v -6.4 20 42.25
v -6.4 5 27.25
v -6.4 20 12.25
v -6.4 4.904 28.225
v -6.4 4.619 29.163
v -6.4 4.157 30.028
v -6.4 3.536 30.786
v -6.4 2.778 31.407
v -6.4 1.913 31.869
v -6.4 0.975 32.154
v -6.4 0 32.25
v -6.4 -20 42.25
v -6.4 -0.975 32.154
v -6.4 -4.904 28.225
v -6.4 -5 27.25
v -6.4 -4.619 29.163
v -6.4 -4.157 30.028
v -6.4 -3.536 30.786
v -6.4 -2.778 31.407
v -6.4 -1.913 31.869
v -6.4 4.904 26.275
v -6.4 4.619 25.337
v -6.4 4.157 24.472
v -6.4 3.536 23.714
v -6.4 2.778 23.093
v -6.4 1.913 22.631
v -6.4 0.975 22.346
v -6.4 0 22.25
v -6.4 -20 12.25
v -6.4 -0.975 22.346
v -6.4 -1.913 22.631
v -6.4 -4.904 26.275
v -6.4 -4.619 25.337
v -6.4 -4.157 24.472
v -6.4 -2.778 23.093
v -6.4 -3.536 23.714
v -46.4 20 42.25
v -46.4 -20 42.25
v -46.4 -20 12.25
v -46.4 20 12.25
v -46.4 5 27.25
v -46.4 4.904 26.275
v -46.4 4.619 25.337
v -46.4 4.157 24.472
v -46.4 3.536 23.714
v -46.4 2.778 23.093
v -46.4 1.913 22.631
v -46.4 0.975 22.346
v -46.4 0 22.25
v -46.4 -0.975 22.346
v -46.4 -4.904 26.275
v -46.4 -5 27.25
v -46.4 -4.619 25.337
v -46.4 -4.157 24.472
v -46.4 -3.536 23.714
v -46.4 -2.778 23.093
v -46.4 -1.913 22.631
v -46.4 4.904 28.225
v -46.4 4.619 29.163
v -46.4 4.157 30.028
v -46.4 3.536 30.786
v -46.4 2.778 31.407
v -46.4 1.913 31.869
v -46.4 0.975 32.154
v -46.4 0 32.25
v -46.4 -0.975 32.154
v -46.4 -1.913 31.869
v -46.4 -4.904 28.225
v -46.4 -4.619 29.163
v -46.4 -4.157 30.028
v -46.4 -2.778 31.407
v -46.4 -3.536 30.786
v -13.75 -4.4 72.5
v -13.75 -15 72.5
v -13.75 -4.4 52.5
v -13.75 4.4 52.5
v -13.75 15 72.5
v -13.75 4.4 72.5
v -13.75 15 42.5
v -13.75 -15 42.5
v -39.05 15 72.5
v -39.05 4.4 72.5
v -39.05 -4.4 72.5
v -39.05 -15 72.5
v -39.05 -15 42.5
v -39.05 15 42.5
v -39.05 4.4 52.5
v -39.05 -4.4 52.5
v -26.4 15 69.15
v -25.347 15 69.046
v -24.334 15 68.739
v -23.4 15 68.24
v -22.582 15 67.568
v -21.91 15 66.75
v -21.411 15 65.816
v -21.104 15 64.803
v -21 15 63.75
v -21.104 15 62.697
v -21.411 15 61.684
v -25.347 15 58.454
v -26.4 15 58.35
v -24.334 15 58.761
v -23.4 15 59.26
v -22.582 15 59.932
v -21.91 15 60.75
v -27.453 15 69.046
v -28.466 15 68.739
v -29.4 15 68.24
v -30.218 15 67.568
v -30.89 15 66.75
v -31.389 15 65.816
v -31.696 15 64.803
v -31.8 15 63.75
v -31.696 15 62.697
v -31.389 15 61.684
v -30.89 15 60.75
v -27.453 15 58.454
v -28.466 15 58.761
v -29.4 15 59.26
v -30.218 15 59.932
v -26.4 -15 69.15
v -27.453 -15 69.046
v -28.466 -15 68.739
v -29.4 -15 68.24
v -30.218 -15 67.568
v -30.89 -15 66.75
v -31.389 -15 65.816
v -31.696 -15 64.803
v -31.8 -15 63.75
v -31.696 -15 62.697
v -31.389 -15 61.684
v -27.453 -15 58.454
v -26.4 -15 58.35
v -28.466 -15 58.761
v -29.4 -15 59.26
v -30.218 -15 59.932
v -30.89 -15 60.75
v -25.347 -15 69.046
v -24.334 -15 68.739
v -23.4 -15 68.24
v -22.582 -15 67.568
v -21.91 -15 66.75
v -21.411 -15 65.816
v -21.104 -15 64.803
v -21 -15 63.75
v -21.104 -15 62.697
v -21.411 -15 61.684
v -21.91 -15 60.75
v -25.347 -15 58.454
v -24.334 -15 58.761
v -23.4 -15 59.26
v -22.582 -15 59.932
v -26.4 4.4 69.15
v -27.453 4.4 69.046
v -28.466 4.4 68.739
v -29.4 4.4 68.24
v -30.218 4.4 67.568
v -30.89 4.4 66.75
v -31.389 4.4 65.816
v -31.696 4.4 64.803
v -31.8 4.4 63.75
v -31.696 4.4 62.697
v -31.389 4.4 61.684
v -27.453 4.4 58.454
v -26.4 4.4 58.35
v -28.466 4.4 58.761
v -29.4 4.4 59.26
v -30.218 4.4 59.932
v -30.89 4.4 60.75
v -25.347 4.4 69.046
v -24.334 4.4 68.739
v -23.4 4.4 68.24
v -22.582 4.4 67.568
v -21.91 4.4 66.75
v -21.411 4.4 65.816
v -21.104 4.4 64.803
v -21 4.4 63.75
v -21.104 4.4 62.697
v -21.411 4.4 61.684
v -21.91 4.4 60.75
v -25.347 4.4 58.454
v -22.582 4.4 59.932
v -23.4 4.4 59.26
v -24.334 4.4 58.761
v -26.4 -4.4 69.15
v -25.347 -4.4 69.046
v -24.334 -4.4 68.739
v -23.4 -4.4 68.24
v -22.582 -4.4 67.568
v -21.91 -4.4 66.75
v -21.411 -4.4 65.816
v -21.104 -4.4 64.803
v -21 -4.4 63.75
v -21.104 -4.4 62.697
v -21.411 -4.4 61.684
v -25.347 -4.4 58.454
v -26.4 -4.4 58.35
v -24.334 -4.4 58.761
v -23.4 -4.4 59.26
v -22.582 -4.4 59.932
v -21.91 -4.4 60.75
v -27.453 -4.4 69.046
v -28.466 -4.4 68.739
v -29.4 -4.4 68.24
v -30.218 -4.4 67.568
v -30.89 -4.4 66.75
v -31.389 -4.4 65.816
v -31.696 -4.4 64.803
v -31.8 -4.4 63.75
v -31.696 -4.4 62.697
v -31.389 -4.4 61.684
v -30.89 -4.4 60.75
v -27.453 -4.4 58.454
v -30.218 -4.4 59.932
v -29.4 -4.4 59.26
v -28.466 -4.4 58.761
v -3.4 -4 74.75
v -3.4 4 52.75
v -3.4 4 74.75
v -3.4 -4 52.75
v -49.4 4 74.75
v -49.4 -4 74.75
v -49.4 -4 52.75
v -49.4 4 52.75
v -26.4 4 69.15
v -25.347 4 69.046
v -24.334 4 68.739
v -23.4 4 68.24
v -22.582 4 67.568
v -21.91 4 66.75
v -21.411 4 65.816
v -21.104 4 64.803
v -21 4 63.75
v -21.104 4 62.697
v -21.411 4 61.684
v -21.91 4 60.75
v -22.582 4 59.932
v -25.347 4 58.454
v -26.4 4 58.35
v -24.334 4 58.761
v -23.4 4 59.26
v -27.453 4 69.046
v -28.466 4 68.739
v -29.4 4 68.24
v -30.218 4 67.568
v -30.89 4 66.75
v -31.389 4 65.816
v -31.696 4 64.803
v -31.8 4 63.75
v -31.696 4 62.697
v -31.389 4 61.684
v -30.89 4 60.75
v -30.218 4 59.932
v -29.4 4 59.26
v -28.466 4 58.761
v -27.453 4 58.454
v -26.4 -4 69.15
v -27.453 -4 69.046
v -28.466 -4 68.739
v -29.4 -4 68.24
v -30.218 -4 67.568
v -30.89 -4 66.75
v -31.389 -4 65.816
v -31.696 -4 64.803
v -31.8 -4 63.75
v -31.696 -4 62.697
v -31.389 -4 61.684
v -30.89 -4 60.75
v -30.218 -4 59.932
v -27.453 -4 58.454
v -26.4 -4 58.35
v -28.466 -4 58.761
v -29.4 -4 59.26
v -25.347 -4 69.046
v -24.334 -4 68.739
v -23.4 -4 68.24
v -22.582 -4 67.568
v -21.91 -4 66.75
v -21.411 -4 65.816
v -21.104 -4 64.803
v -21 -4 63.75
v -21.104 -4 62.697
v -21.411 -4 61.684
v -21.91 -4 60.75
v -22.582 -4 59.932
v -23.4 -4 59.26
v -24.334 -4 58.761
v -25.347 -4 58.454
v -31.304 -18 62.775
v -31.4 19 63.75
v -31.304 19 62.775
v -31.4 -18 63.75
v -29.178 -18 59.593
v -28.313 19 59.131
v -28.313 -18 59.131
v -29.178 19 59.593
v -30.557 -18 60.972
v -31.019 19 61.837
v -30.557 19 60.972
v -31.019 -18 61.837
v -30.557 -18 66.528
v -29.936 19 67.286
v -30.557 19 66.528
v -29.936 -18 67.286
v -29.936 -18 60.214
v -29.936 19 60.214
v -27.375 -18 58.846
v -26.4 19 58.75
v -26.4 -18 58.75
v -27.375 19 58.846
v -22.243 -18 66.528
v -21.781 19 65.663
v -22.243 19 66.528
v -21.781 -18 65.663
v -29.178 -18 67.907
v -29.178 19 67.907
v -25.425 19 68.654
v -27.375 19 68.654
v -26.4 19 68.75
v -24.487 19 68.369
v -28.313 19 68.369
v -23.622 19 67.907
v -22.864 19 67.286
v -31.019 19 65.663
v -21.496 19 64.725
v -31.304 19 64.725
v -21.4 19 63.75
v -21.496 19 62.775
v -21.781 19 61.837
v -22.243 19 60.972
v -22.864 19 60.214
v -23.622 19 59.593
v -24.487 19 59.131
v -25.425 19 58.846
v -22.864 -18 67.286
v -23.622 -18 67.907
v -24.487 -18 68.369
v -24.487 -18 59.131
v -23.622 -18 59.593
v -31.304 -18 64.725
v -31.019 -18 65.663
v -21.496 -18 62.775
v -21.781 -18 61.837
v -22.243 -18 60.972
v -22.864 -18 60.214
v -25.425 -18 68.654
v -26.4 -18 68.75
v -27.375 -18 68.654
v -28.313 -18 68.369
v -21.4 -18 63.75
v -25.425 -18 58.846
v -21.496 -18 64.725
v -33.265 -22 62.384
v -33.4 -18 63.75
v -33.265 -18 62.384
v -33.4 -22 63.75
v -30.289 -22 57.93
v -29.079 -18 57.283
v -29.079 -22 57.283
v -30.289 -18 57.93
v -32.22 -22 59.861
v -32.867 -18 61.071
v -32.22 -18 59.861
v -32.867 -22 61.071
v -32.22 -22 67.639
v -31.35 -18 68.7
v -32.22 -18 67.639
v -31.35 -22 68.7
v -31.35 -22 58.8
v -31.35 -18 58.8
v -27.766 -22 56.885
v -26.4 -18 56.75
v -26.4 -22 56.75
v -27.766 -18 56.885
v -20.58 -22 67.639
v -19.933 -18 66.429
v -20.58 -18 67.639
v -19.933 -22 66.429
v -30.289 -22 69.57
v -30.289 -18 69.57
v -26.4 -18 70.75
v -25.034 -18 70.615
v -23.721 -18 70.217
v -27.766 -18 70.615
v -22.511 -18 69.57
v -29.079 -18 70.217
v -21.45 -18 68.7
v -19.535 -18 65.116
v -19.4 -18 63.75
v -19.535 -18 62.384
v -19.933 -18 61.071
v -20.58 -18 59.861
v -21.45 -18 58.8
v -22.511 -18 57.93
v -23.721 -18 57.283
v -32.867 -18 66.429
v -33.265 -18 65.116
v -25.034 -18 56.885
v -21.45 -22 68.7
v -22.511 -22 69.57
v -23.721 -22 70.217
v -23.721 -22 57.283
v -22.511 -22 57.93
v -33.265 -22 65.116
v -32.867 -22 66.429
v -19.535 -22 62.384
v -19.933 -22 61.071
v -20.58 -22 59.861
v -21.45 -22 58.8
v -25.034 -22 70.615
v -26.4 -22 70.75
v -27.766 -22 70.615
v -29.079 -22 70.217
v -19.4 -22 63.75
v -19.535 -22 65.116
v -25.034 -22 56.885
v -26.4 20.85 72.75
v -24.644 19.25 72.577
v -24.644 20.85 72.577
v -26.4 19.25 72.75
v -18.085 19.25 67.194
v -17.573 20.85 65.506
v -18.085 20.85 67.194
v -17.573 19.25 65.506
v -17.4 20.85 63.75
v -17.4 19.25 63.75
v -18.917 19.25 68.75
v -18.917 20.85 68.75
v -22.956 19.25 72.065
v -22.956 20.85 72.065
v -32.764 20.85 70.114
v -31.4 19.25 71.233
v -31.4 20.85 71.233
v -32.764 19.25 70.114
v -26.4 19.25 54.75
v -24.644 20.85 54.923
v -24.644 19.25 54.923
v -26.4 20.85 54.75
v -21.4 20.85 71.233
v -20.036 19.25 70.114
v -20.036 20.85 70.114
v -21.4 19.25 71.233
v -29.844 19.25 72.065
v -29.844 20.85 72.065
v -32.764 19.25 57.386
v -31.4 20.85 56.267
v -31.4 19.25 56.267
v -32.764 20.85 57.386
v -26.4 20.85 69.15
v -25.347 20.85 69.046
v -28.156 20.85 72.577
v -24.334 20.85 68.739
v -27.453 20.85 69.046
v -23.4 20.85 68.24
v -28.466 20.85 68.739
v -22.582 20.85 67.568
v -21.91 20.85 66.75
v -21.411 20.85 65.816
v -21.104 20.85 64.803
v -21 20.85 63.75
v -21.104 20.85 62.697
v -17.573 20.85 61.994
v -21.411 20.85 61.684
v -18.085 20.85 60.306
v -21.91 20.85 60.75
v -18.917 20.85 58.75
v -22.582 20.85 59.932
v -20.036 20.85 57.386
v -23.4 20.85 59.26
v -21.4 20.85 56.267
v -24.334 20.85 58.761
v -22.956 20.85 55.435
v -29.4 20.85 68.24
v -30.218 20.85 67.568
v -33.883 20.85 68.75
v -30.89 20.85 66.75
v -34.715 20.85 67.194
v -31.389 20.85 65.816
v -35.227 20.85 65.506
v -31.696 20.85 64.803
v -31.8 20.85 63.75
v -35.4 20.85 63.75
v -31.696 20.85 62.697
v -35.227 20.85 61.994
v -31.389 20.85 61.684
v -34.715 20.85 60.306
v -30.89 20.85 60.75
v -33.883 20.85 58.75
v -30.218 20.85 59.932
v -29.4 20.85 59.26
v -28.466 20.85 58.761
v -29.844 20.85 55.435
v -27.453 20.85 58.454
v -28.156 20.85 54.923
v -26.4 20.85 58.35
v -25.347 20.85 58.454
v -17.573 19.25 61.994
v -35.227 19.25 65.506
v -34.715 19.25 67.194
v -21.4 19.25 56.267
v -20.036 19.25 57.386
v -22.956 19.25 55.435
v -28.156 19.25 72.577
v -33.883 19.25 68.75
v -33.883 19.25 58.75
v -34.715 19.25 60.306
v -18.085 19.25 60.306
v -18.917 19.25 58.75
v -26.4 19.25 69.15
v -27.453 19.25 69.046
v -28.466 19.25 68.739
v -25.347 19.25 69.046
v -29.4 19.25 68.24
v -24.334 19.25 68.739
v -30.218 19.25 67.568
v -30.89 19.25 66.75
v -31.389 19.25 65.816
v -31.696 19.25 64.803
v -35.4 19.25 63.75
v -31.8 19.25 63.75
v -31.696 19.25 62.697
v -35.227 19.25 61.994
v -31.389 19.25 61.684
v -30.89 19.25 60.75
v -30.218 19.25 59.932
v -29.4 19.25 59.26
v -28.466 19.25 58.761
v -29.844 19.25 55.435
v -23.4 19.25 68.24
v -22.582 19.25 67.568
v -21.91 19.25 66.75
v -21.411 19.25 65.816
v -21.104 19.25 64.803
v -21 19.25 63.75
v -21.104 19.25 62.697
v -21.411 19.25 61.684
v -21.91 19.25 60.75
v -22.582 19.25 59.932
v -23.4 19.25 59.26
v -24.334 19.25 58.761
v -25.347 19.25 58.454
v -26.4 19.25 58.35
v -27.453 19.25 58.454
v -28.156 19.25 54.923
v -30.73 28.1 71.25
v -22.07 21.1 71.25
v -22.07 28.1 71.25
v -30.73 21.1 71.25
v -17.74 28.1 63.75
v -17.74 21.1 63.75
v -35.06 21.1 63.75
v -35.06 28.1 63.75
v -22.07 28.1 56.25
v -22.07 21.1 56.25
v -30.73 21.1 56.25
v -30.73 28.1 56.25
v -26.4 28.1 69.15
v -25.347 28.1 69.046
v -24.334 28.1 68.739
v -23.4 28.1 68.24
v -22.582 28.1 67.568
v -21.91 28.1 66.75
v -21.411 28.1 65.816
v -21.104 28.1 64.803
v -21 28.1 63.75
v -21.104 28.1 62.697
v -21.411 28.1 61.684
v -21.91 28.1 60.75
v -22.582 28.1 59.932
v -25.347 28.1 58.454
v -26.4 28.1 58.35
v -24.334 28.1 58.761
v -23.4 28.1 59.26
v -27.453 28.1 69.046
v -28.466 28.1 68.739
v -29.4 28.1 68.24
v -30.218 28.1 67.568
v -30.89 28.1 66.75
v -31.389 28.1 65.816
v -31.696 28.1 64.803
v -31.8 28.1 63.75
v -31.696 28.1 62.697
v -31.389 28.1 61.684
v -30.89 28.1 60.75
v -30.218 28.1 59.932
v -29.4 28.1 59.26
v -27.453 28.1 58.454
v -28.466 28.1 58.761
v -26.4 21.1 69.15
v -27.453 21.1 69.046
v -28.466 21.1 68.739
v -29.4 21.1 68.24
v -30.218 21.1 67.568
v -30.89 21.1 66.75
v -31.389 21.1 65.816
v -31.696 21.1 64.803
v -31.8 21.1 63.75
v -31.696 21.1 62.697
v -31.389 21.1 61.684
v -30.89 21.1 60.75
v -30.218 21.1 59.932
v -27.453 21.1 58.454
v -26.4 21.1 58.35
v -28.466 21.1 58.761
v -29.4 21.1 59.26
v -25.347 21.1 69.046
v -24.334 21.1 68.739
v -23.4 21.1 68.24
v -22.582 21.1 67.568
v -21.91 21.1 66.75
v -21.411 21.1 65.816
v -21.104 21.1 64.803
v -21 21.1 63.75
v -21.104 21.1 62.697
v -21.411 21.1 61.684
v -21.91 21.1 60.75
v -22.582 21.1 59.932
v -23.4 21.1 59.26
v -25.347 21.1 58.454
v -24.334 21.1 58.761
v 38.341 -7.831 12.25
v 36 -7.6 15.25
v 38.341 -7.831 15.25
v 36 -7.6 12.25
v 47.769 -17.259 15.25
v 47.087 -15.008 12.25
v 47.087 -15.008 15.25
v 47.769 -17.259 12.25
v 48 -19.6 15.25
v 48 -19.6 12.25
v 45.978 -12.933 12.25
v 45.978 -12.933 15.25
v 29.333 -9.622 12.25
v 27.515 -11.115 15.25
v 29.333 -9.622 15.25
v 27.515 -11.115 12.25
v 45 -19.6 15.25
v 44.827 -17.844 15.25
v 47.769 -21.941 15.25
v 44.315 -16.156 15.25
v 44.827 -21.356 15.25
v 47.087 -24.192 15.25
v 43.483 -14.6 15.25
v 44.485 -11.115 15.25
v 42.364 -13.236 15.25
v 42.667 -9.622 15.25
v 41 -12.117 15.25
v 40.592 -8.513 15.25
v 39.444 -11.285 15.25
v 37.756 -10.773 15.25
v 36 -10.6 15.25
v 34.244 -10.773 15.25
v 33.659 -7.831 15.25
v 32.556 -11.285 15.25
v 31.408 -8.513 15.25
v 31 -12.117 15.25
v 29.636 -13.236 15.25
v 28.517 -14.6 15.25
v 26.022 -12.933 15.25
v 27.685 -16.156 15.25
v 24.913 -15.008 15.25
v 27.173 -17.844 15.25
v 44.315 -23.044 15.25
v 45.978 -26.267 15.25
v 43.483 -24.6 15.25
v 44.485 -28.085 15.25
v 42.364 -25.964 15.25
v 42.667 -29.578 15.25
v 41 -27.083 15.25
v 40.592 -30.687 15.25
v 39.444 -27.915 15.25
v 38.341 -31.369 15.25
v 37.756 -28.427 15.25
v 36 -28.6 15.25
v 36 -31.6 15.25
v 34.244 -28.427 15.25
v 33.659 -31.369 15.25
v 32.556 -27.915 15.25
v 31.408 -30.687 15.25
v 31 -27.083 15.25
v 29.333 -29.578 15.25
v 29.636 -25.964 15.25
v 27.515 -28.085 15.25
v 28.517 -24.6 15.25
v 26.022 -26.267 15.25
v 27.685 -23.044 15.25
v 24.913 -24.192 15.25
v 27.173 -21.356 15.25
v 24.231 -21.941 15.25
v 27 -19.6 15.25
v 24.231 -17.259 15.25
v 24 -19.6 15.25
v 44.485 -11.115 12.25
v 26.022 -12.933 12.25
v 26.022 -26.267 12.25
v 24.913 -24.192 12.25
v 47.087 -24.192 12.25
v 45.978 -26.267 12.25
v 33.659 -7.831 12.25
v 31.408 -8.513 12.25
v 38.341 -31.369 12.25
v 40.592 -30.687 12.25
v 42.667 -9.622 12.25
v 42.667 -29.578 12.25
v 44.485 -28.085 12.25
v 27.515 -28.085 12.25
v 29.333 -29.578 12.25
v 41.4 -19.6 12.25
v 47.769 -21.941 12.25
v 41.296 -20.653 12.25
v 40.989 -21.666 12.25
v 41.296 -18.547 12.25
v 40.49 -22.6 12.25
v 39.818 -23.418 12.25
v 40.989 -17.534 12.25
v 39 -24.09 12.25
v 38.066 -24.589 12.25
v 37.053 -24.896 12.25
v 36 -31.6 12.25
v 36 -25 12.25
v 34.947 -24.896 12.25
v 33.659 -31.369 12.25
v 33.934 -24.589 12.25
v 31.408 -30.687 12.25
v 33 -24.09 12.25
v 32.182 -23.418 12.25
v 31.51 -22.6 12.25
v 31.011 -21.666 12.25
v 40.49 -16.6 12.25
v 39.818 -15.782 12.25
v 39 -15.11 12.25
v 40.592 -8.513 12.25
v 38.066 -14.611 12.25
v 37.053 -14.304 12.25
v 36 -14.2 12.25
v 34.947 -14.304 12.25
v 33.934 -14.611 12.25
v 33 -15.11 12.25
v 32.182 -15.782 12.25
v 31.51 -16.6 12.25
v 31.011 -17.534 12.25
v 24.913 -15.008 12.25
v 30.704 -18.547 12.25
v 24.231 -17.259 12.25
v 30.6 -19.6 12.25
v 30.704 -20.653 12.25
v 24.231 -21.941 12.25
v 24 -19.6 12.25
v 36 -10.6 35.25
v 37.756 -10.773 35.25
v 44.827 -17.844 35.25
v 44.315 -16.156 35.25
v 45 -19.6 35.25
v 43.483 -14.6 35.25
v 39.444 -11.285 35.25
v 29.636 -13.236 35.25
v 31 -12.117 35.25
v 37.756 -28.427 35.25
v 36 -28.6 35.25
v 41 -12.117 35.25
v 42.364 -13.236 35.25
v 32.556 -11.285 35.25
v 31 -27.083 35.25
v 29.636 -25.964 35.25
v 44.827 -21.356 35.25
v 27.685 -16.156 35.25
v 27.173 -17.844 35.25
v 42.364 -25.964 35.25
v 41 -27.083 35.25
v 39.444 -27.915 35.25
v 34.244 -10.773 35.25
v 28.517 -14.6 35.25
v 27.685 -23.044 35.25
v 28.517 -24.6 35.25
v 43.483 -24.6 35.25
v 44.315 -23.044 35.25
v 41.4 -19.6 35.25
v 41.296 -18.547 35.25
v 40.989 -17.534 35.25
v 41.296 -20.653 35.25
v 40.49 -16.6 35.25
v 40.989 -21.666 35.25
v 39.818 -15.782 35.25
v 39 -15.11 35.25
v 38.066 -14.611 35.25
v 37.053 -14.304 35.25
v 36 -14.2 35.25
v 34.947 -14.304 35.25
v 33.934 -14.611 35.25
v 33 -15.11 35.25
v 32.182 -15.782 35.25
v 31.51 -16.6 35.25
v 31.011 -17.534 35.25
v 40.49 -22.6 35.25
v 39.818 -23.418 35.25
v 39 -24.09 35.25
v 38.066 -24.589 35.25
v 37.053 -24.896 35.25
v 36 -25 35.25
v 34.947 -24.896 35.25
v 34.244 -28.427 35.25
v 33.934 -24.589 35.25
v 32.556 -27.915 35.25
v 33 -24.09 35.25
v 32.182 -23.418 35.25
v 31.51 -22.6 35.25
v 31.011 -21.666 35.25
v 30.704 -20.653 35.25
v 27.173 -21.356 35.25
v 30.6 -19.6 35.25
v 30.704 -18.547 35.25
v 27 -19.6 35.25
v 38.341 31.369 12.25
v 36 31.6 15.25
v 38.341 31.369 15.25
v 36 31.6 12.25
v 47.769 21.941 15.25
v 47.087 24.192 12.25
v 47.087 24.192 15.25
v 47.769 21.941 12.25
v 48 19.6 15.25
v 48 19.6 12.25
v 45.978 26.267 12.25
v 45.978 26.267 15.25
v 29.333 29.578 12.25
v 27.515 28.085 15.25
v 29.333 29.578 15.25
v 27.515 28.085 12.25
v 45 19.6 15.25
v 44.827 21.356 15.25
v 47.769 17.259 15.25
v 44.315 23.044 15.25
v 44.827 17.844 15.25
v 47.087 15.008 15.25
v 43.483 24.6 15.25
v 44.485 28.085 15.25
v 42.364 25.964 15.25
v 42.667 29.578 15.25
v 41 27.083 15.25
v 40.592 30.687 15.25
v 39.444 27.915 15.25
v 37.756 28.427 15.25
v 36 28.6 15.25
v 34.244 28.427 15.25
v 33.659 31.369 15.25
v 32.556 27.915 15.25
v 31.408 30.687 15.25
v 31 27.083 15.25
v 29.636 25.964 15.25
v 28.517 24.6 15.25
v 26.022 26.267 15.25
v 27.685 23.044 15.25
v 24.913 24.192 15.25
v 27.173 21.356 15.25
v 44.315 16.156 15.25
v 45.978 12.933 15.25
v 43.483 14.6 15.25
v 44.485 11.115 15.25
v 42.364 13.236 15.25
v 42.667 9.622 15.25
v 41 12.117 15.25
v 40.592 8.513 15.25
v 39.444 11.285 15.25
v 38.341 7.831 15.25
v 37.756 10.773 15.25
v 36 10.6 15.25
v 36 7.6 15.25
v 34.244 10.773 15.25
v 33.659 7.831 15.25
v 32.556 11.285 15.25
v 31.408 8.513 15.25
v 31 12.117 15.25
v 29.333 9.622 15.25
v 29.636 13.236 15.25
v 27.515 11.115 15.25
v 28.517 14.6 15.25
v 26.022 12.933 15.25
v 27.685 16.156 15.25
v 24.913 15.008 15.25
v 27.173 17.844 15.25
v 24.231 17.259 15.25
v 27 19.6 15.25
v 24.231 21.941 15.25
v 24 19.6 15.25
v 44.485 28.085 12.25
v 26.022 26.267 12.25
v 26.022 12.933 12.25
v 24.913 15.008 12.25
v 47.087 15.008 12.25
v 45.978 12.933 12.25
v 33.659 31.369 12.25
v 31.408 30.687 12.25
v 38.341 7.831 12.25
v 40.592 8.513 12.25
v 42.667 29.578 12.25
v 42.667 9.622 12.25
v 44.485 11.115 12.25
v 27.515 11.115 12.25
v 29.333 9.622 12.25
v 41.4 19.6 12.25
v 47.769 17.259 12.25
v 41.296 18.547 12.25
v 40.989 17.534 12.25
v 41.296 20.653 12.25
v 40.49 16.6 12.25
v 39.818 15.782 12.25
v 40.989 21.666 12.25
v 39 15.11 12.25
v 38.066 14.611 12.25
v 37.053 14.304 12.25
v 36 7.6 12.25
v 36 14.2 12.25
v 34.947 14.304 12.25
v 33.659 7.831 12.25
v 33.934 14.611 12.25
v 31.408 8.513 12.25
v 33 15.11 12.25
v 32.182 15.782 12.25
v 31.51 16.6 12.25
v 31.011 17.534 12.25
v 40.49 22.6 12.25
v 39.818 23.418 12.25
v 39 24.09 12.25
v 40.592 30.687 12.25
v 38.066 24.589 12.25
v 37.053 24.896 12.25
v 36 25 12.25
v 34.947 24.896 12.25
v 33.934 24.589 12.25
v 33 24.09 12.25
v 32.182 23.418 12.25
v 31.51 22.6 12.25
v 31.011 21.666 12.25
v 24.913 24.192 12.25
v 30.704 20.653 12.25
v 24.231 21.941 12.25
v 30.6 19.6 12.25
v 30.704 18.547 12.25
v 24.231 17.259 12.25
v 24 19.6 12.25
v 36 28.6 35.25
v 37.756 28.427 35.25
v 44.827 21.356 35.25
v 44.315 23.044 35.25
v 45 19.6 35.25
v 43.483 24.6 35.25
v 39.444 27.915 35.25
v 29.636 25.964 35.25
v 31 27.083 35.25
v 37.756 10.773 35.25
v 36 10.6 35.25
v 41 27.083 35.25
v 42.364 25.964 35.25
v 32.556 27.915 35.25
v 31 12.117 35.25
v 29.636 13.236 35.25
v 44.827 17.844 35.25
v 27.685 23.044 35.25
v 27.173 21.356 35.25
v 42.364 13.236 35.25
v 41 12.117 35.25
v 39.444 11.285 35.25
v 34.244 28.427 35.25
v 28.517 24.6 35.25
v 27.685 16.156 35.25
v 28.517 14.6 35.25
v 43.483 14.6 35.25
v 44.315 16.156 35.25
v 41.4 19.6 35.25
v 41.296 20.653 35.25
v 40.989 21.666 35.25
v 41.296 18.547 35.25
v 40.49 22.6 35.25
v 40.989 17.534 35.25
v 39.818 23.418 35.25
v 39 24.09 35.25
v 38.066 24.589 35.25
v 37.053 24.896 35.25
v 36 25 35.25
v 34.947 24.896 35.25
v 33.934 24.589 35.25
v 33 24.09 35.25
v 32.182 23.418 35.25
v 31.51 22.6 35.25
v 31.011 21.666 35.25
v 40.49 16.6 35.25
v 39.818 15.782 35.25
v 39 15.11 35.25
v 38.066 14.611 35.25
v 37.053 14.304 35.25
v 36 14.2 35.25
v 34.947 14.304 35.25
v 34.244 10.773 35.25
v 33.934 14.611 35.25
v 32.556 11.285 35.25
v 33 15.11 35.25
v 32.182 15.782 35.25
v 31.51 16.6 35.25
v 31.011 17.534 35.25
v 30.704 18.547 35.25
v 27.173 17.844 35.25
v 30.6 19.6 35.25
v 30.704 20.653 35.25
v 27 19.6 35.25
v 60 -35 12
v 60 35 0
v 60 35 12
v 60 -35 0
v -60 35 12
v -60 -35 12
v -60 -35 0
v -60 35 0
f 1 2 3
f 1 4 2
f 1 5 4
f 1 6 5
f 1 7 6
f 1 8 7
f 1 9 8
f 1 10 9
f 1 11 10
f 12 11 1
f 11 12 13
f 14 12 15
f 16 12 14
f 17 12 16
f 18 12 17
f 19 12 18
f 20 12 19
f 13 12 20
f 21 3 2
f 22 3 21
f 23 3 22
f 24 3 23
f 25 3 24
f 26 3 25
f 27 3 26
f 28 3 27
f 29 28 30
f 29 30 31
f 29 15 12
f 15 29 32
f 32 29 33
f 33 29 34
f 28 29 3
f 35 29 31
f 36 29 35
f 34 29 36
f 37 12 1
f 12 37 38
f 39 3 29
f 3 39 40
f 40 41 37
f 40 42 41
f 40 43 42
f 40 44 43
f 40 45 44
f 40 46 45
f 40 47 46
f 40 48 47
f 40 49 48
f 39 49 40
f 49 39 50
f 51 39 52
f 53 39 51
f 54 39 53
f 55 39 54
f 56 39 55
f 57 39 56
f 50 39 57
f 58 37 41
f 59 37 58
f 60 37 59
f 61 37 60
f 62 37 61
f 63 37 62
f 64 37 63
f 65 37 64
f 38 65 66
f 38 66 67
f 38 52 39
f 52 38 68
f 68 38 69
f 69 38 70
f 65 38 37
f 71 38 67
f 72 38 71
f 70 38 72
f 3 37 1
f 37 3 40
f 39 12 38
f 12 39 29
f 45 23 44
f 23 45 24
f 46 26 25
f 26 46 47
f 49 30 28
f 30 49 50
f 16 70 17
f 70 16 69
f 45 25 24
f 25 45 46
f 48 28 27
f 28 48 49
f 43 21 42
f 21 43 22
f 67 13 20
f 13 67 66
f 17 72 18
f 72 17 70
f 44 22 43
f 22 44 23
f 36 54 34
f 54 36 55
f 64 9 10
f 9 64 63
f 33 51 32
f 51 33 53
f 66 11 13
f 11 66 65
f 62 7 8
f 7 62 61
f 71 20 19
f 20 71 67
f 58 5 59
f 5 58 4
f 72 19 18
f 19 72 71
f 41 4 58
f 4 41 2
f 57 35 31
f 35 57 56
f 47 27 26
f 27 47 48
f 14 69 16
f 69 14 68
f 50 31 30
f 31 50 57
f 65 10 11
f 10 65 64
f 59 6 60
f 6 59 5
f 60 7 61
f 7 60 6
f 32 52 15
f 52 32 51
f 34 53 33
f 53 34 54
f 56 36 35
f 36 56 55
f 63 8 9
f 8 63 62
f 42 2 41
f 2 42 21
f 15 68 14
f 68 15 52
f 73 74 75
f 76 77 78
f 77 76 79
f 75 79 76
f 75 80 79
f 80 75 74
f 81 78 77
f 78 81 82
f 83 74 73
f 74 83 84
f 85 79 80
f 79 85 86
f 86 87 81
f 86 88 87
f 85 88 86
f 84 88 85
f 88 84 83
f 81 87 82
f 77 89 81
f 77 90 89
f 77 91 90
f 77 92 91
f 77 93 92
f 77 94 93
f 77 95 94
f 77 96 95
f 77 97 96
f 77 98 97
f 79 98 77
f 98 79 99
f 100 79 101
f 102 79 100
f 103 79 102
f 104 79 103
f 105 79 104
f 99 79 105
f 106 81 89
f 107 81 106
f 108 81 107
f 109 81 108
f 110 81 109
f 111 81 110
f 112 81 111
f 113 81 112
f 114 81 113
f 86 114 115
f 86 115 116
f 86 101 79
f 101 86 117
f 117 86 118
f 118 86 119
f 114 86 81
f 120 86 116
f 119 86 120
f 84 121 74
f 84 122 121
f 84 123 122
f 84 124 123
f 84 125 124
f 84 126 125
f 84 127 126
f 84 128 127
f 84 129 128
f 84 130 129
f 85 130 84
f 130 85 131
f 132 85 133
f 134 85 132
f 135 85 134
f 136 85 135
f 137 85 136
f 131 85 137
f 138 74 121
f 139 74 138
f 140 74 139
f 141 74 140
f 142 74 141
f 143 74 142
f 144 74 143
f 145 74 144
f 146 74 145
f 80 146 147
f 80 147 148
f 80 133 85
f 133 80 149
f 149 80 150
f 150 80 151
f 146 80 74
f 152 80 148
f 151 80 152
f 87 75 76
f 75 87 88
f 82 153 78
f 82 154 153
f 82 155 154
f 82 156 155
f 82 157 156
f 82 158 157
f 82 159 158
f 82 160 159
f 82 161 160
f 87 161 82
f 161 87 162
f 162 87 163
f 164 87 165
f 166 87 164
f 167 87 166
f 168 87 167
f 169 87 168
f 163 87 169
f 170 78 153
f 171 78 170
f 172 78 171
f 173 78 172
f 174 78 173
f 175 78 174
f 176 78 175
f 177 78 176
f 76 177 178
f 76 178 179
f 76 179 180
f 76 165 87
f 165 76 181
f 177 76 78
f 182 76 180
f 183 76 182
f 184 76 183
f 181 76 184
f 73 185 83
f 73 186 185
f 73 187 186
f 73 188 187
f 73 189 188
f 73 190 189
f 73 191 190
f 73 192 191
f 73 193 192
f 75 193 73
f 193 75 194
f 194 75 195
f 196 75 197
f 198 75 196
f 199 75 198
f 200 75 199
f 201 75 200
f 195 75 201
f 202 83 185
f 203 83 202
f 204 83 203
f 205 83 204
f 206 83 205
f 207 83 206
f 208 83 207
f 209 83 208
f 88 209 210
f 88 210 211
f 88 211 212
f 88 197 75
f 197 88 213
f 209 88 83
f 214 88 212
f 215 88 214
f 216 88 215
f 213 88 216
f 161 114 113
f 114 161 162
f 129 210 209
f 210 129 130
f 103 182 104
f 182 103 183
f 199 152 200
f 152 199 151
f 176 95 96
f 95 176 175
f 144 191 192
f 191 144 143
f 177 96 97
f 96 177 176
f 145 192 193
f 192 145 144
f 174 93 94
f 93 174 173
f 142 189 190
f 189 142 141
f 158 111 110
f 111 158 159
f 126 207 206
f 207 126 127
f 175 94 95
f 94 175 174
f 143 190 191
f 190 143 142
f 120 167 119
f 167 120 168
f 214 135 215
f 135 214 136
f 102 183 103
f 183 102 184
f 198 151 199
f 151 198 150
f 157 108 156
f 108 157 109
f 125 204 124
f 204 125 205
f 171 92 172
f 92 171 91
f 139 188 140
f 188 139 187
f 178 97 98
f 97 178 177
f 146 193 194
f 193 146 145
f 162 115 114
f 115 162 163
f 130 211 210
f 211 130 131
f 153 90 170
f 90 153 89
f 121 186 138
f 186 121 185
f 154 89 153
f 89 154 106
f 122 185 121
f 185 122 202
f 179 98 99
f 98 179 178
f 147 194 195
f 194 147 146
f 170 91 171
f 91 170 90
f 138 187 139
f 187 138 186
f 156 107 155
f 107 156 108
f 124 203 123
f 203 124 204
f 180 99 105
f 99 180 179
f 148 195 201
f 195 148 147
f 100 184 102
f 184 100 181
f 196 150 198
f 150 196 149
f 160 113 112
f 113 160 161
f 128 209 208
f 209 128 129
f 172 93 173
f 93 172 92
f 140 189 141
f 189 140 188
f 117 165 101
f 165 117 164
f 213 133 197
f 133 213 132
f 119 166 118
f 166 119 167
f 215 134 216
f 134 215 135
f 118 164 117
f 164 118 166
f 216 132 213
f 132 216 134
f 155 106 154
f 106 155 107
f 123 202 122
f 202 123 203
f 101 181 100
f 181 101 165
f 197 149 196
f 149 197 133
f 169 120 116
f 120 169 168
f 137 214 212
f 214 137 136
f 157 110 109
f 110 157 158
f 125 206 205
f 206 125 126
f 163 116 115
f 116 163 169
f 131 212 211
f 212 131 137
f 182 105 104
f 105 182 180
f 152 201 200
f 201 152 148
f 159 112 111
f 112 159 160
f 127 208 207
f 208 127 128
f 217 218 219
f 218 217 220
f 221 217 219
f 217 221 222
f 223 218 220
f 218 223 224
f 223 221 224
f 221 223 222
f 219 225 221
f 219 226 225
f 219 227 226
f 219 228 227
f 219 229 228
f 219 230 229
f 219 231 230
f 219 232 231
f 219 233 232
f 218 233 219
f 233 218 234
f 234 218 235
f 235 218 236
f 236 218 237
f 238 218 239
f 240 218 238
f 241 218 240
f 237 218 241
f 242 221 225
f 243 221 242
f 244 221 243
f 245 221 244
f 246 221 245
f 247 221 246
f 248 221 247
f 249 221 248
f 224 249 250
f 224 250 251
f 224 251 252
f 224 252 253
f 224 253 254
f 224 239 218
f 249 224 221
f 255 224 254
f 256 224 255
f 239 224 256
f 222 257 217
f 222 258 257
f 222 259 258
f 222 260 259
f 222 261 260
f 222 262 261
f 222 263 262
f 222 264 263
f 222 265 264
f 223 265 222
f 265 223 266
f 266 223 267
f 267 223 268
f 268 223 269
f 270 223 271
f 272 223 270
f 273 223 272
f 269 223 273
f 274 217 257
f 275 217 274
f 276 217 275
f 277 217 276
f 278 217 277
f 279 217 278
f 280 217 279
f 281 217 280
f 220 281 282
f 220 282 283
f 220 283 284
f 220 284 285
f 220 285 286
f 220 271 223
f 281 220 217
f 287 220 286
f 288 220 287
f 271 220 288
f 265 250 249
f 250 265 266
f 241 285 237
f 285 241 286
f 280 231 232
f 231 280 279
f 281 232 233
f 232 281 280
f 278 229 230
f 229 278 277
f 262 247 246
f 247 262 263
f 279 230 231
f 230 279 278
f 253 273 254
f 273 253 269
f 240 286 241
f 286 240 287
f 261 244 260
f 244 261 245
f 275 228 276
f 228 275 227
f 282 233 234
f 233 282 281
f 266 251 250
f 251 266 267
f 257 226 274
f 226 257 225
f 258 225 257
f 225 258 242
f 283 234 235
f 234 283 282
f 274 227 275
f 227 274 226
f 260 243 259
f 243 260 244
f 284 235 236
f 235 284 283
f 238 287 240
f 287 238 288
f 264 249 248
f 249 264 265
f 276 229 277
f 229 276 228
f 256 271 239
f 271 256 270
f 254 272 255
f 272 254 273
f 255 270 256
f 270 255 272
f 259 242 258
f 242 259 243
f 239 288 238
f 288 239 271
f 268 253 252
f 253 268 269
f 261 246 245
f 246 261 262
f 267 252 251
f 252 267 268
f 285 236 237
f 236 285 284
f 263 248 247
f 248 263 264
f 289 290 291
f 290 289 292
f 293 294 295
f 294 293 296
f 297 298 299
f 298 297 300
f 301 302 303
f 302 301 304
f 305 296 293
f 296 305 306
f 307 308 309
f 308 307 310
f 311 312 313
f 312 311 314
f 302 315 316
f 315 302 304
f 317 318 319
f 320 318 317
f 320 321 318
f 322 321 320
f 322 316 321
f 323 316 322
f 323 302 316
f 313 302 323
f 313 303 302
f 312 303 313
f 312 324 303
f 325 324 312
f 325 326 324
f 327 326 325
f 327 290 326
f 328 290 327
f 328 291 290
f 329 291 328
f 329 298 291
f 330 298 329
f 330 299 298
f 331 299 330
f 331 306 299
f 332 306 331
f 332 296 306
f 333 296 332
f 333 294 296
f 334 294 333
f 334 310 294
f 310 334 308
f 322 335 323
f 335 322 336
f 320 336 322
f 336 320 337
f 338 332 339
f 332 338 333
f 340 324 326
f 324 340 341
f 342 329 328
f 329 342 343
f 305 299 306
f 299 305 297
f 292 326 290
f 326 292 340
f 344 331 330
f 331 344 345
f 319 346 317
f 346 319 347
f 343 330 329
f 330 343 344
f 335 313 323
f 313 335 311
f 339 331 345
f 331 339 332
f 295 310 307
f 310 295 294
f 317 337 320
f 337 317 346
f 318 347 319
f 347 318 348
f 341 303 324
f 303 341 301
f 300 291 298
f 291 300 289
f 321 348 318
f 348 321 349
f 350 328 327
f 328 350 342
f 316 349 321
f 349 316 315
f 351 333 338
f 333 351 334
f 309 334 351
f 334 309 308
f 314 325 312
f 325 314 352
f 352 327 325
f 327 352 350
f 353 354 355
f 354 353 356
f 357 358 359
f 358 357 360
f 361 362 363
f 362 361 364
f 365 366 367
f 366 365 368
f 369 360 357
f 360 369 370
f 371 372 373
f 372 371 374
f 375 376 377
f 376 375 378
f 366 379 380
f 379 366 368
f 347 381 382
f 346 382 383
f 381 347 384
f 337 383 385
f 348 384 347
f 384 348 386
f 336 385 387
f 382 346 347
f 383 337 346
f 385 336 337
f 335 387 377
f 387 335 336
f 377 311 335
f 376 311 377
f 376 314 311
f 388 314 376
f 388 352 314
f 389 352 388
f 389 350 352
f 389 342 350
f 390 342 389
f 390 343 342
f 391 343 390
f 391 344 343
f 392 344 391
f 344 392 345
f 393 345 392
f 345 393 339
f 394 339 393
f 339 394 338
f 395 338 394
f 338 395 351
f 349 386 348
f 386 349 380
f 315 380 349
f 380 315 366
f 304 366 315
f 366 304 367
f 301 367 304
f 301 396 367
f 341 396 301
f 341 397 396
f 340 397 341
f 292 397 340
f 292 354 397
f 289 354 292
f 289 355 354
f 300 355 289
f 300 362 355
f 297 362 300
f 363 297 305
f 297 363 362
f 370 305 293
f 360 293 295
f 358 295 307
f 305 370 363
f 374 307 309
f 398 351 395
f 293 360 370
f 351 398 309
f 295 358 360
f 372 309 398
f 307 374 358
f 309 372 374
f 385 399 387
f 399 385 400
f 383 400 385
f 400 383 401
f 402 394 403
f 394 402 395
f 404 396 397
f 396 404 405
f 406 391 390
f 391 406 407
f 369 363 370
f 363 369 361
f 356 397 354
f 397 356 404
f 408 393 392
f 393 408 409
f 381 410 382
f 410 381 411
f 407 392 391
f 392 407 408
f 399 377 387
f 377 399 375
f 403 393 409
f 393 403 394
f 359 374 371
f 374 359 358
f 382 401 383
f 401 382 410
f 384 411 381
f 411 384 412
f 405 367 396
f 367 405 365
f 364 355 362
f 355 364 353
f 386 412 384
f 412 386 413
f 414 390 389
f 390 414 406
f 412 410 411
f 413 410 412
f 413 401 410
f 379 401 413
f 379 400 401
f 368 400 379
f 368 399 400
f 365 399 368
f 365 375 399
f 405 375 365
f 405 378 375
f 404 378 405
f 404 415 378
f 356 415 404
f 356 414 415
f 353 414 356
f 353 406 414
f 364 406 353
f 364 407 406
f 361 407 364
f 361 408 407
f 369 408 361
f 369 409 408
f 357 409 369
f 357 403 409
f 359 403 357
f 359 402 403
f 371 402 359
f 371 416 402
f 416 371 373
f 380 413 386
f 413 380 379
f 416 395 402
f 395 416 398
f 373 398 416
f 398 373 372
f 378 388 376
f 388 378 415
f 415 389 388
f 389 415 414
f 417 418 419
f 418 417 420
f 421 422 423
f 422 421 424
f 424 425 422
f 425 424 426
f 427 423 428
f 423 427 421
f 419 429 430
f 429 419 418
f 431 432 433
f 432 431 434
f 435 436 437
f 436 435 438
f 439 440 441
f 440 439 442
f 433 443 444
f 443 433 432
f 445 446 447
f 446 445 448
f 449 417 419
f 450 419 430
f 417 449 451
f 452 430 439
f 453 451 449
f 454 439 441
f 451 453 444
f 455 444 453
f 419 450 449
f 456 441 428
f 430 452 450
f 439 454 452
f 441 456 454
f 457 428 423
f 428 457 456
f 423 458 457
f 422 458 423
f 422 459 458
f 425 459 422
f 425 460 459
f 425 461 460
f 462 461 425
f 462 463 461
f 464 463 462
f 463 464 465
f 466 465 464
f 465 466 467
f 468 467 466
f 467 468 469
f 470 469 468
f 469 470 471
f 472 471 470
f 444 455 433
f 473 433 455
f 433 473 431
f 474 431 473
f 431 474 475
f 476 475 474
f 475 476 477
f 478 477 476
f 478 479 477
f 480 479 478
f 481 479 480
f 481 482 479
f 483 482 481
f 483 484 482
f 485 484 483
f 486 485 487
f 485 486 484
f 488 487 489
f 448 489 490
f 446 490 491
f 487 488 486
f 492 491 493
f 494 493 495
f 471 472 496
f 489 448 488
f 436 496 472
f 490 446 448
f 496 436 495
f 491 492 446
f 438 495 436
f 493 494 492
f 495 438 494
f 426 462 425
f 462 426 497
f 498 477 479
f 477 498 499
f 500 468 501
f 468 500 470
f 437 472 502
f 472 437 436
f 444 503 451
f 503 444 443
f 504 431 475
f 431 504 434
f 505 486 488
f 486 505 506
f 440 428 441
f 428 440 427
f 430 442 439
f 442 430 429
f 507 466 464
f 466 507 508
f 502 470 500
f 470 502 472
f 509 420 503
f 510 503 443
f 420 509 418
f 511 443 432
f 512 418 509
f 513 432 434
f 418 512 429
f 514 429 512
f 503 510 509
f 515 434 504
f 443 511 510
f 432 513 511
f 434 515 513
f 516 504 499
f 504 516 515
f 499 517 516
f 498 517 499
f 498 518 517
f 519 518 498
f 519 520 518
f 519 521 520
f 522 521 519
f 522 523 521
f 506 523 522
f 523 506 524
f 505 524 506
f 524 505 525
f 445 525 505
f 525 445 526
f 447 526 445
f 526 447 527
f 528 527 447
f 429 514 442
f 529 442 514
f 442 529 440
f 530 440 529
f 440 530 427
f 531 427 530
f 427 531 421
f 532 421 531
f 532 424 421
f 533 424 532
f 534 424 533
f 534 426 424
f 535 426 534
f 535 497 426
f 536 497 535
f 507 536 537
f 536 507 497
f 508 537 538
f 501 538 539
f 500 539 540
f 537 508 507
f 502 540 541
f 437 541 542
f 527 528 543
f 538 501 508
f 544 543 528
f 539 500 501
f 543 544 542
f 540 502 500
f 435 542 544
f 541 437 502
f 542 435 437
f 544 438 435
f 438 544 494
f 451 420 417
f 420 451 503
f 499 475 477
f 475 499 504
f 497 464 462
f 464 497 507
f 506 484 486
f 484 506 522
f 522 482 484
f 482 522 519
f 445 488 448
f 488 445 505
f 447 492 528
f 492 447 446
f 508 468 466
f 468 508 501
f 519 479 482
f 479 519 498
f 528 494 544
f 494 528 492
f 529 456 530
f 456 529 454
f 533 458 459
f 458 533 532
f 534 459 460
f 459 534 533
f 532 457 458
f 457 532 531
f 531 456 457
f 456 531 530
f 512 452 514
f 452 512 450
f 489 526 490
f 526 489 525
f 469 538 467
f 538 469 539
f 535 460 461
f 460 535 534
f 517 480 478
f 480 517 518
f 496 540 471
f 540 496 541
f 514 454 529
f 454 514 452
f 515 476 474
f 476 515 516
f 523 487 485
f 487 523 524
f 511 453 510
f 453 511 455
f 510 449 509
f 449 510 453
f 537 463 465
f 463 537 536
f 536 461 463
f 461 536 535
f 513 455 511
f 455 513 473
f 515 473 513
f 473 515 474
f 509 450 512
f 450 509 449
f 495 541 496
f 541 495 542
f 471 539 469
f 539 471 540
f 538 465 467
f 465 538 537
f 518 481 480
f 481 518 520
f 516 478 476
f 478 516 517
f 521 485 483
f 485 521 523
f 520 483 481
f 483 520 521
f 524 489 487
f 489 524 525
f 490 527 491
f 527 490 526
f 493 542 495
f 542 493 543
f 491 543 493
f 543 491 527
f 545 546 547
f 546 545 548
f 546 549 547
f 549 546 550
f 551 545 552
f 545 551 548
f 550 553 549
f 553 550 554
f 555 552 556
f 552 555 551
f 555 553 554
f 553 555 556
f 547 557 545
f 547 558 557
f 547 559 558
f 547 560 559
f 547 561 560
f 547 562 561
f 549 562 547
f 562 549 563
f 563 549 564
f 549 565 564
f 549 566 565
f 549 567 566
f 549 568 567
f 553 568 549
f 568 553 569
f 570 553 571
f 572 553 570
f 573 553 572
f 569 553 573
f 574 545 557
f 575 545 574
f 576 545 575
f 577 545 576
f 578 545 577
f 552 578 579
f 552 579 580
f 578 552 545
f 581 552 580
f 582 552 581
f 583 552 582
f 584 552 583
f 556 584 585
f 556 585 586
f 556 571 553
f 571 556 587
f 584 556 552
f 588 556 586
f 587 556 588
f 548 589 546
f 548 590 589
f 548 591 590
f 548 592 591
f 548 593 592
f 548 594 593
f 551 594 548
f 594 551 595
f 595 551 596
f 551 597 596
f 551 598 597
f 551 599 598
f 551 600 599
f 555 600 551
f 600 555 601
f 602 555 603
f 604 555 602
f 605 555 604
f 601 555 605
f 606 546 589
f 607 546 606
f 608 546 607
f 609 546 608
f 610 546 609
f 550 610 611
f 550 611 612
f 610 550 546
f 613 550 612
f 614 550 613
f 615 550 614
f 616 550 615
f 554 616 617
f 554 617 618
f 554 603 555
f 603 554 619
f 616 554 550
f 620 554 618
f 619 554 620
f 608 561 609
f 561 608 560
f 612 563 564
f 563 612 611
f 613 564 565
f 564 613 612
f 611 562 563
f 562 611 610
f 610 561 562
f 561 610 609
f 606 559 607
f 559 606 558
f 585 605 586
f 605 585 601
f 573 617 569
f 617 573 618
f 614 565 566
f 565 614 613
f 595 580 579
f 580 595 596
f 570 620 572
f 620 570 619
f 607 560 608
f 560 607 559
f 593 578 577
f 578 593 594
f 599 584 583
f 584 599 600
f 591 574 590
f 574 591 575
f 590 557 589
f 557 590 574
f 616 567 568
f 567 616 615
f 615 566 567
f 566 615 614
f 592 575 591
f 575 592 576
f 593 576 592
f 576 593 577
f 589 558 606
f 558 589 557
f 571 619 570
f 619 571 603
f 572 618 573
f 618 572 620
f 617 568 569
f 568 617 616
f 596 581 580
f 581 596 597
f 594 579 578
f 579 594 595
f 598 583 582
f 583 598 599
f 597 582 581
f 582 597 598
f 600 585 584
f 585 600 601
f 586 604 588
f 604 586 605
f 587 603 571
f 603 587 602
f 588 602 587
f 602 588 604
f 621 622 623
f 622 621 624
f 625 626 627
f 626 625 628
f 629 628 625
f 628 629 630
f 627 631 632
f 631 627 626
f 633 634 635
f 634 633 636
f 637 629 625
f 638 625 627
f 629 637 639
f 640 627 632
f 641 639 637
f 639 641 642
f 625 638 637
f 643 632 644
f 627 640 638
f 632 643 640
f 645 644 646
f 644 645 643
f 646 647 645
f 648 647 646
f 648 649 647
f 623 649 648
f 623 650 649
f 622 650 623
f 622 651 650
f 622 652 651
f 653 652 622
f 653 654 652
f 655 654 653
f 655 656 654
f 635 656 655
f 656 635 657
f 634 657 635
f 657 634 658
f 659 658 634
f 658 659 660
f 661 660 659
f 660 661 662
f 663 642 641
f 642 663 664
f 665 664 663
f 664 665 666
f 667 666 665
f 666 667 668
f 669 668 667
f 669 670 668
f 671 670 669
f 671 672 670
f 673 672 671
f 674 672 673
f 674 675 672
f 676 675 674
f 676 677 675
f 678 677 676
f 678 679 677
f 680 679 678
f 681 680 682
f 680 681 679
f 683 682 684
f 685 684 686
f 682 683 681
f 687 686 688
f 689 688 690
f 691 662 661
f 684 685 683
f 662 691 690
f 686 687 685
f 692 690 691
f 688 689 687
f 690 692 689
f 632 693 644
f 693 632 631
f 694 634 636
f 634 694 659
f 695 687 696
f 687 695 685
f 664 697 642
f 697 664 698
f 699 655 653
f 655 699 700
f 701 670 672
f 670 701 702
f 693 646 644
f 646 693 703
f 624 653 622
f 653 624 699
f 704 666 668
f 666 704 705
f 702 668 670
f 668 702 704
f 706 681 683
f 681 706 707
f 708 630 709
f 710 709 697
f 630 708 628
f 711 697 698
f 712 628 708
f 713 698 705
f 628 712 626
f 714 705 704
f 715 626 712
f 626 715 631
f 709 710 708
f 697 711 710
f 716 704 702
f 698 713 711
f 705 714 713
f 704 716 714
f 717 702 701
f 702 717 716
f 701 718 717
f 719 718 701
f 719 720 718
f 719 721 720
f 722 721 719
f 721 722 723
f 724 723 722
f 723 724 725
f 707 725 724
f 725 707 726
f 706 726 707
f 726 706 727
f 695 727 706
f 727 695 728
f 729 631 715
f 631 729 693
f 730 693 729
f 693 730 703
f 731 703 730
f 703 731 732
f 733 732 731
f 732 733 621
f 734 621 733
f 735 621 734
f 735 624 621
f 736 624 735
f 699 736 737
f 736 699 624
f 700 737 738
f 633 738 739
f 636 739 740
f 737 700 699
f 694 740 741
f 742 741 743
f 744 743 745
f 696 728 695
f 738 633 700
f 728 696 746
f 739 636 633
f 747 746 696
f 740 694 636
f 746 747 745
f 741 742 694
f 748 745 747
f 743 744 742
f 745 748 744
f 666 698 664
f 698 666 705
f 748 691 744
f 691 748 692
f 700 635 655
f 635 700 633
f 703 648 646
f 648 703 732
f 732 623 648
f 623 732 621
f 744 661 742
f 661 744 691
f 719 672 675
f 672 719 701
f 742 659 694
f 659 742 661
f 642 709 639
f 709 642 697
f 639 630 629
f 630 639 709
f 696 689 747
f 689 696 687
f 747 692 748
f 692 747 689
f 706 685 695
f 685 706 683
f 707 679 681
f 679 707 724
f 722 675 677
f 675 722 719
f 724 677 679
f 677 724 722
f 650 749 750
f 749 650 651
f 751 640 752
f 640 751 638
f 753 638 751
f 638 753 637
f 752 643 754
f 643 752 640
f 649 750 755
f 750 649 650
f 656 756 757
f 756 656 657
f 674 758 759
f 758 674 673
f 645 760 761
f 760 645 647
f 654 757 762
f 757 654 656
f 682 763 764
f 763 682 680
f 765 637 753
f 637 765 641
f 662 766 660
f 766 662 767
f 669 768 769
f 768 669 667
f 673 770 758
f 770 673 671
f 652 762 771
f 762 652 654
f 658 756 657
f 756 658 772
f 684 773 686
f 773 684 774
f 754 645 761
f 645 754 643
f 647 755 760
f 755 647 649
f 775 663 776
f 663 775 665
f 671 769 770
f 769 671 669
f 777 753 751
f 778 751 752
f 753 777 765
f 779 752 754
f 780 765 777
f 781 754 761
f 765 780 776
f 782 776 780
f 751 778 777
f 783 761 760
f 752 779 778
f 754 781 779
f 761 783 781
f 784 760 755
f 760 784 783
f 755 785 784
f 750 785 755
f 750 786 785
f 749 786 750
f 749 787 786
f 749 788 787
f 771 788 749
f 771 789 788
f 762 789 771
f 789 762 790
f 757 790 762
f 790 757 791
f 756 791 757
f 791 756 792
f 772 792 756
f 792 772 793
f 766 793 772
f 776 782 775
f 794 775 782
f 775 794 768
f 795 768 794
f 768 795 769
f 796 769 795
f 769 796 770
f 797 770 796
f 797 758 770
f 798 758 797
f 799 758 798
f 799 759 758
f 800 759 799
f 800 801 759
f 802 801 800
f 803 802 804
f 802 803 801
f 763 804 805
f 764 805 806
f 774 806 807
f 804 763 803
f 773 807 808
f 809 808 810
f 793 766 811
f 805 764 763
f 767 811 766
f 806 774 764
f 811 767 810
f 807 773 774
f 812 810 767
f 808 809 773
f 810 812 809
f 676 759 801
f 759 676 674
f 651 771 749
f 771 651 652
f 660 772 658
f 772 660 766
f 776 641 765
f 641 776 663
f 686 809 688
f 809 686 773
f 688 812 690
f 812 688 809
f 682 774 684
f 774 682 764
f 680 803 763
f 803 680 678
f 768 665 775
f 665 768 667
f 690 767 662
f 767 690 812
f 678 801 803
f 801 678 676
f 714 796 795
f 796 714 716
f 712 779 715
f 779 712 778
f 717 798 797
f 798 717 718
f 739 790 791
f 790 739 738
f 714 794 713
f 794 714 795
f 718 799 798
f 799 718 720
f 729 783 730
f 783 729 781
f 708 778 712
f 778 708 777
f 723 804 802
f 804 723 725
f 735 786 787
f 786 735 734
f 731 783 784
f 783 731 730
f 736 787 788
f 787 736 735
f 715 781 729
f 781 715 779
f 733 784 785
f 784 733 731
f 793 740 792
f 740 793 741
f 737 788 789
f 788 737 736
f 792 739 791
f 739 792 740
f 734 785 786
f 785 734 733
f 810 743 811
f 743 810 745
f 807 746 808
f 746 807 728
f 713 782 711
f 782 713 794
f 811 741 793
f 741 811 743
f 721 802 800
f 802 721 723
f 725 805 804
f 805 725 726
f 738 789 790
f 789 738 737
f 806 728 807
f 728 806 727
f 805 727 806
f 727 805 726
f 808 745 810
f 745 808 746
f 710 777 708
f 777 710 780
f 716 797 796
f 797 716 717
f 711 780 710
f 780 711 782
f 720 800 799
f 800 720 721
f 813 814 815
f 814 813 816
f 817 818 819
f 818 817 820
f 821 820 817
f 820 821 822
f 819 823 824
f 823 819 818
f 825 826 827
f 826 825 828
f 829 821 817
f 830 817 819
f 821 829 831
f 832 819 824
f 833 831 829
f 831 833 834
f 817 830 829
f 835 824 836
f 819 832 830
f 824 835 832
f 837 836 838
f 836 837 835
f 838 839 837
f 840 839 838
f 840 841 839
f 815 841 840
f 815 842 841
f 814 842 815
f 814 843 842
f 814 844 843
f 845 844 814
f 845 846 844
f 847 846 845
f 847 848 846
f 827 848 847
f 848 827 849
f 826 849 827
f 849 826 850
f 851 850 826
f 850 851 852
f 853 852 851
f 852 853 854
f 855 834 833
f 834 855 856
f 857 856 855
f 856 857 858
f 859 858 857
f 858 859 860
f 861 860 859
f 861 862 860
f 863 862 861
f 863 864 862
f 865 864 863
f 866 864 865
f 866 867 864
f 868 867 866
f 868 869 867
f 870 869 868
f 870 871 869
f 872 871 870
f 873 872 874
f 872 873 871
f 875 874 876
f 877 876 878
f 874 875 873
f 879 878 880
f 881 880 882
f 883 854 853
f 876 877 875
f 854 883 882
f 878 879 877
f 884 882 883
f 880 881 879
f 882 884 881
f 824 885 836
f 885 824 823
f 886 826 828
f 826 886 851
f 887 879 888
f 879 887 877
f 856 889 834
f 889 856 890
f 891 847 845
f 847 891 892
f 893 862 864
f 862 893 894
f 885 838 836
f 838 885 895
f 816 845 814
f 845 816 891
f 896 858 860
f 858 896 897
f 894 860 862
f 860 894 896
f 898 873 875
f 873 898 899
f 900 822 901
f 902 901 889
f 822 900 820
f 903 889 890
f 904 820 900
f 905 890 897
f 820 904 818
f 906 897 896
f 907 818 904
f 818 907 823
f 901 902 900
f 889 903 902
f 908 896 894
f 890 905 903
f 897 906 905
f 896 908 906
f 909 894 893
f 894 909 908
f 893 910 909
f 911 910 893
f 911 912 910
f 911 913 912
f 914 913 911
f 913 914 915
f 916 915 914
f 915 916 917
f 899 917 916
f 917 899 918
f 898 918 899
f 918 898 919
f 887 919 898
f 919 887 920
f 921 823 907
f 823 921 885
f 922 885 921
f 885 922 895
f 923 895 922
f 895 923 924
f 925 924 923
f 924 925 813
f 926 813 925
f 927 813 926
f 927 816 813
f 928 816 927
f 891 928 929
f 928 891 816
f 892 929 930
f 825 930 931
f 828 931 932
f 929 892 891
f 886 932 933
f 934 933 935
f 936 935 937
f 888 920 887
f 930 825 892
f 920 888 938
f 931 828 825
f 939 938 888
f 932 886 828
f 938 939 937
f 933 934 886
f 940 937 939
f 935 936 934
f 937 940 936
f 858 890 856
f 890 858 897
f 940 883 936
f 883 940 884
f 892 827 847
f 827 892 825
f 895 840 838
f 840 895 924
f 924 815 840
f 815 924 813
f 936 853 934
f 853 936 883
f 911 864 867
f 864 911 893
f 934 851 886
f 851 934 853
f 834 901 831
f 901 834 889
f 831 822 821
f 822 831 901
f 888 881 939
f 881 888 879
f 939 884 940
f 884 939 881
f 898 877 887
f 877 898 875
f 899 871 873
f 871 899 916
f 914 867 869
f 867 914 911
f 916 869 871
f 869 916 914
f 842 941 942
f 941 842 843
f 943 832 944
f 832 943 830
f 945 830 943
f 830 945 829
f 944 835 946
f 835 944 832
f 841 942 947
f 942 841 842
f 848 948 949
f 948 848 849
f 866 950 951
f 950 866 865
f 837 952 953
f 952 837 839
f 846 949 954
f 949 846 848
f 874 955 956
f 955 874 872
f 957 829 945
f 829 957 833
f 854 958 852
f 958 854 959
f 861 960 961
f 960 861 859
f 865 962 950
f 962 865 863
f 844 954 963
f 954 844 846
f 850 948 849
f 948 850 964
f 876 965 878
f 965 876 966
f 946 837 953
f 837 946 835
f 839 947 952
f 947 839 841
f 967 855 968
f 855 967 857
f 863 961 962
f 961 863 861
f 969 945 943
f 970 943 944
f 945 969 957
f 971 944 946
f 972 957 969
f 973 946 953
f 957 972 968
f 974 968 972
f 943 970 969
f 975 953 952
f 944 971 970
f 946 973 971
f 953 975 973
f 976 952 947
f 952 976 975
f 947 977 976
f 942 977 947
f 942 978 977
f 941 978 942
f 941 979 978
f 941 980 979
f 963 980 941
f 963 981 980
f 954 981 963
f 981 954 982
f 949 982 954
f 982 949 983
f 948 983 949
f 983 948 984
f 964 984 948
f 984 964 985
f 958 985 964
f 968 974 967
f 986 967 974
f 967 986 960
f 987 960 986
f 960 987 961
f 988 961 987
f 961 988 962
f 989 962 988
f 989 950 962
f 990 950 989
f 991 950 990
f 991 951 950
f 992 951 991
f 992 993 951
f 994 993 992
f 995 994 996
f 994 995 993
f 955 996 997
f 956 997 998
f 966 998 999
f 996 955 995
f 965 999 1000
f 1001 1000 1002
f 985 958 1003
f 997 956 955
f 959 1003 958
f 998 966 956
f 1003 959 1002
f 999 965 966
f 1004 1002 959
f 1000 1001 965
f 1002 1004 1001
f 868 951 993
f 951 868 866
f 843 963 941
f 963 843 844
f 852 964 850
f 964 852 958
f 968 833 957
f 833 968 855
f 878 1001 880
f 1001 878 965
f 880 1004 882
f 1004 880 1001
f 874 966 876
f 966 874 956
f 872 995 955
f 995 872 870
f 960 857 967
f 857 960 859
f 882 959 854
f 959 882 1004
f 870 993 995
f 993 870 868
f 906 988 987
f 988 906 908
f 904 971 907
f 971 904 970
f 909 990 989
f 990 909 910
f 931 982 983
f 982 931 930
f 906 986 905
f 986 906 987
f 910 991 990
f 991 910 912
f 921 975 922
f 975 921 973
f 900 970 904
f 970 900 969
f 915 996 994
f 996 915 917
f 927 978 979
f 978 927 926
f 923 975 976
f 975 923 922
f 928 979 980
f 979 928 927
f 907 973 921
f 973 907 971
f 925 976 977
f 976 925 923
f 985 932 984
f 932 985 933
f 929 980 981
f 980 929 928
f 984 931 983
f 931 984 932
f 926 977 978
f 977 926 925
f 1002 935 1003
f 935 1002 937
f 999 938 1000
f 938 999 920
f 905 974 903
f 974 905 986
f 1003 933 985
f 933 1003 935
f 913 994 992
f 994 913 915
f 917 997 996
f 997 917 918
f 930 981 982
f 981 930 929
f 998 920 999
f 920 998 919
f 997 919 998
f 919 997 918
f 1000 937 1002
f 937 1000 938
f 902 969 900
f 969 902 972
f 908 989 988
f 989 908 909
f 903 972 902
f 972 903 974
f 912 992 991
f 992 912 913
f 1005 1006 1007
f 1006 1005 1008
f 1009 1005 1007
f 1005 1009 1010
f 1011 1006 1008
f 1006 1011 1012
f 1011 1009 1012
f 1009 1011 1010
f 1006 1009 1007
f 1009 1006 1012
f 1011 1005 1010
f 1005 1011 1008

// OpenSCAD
$fn = 32;

// ------------------------------------------------------------------------
// Indexing jig: plate 120 x 70 mm, pin d10
// Every part is its own module, assembly() places every instance.
// ------------------------------------------------------------------------

// --- part 1 ---
module jig_plate() {
  difference() {
    translate([-60, -35, 0]) cube([120, 70, 12]);
  }
}

// --- part 2 ---
module locator_block() {
  difference() {
    translate([-20, -20, 0]) cube([40, 40, 30]);
    translate([0, 0, 15]) rotate([0, 90, 0]) cylinder(h = 42, d = 10, center = true);
  }
}

// --- part 3 ---
module index_fork() {
  difference() {
    translate([-12.65, -15, 0]) cube([25.3, 30, 30]);
    translate([-13.65, -4.4, 10]) cube([27.3, 8.8, 21]);
    translate([0, 0, 21.25]) rotate([90, 0, 0]) cylinder(h = 32, d = 10.8, center = true);
  }
}

// --- part 4 ---
module index_arm() {
  difference() {
    translate([-23, -4, 0]) cube([46, 8, 22]);
    translate([0, 0, 11]) rotate([90, 0, 0]) cylinder(h = 10, d = 10.8, center = true);
  }
}

// --- part 5 ---
module index_pin() {
  rotate([0, 90, 0]) cylinder(h = 38, d = 10, center = true);
  translate([-22, 0, 0]) rotate([0, 90, 0]) cylinder(h = 4, d = 14);
}

// --- part 6 ---
module pin_washer() {
  difference() {
      translate([0, 0, 0]) cylinder(h = 1.6, d = 18);
      translate([0, 0, -1]) cylinder(h = 3.6, d = 10.8);
    }
}

// --- part 7 ---
module lock_nut() {
  difference() {
    linear_extrude(height = 7) polygon(points = [[8.66, 0], [4.33, 7.5], [-4.33, 7.5], [-8.66, 0], [-4.33, -7.5], [4.33, -7.5]]);
    translate([0, 0, -1]) cylinder(h = 9, d = 10.8);
  }
}

// --- part 8 ---
module guide_bush_a() {
  difference() {
    union() {
      cylinder(h = 3, d = 24);
      translate([0, 0, 3]) cylinder(h = 20, d = 18);
    }
    translate([0, 0, -1]) cylinder(h = 25, d = 10.8);
  }
}

// --- part 9 ---
module guide_bush_b() {
  difference() {
    union() {
      cylinder(h = 3, d = 24);
      translate([0, 0, 3]) cylinder(h = 20, d = 18);
    }
    translate([0, 0, -1]) cylinder(h = 25, d = 10.8);
  }
}

// --- assembly ---
module assembly() {
  color([0.80, 0.24, 0.20]) translate([0, 0, 0]) rotate([0, 0, 0]) jig_plate();
  color([0.20, 0.45, 0.75]) translate([-26.4, 0, 12.25]) rotate([0, 0, 0]) locator_block();
  color([0.25, 0.62, 0.32]) translate([-26.4, 0, 42.5]) rotate([0, 0, 0]) index_fork();
  color([0.92, 0.70, 0.18]) translate([-26.4, 0, 52.75]) rotate([0, 0, 0]) index_arm();
  color([0.58, 0.35, 0.70]) translate([-26.4, 0, 63.75]) rotate([0, 0, 90]) index_pin();
  color([0.16, 0.66, 0.66]) translate([-26.4, 20.85, 63.75]) rotate([90, 0, 0]) pin_washer();
  color([0.85, 0.48, 0.18]) translate([-26.4, 28.1, 63.75]) rotate([90, 0, 0]) lock_nut();
  color([0.55, 0.60, 0.65]) translate([36, -19.6, 12.25]) rotate([0, 0, 0]) guide_bush_a();
  color([0.75, 0.30, 0.55]) translate([36, 19.6, 12.25]) rotate([0, 0, 0]) guide_bush_b();
}

assembly();
